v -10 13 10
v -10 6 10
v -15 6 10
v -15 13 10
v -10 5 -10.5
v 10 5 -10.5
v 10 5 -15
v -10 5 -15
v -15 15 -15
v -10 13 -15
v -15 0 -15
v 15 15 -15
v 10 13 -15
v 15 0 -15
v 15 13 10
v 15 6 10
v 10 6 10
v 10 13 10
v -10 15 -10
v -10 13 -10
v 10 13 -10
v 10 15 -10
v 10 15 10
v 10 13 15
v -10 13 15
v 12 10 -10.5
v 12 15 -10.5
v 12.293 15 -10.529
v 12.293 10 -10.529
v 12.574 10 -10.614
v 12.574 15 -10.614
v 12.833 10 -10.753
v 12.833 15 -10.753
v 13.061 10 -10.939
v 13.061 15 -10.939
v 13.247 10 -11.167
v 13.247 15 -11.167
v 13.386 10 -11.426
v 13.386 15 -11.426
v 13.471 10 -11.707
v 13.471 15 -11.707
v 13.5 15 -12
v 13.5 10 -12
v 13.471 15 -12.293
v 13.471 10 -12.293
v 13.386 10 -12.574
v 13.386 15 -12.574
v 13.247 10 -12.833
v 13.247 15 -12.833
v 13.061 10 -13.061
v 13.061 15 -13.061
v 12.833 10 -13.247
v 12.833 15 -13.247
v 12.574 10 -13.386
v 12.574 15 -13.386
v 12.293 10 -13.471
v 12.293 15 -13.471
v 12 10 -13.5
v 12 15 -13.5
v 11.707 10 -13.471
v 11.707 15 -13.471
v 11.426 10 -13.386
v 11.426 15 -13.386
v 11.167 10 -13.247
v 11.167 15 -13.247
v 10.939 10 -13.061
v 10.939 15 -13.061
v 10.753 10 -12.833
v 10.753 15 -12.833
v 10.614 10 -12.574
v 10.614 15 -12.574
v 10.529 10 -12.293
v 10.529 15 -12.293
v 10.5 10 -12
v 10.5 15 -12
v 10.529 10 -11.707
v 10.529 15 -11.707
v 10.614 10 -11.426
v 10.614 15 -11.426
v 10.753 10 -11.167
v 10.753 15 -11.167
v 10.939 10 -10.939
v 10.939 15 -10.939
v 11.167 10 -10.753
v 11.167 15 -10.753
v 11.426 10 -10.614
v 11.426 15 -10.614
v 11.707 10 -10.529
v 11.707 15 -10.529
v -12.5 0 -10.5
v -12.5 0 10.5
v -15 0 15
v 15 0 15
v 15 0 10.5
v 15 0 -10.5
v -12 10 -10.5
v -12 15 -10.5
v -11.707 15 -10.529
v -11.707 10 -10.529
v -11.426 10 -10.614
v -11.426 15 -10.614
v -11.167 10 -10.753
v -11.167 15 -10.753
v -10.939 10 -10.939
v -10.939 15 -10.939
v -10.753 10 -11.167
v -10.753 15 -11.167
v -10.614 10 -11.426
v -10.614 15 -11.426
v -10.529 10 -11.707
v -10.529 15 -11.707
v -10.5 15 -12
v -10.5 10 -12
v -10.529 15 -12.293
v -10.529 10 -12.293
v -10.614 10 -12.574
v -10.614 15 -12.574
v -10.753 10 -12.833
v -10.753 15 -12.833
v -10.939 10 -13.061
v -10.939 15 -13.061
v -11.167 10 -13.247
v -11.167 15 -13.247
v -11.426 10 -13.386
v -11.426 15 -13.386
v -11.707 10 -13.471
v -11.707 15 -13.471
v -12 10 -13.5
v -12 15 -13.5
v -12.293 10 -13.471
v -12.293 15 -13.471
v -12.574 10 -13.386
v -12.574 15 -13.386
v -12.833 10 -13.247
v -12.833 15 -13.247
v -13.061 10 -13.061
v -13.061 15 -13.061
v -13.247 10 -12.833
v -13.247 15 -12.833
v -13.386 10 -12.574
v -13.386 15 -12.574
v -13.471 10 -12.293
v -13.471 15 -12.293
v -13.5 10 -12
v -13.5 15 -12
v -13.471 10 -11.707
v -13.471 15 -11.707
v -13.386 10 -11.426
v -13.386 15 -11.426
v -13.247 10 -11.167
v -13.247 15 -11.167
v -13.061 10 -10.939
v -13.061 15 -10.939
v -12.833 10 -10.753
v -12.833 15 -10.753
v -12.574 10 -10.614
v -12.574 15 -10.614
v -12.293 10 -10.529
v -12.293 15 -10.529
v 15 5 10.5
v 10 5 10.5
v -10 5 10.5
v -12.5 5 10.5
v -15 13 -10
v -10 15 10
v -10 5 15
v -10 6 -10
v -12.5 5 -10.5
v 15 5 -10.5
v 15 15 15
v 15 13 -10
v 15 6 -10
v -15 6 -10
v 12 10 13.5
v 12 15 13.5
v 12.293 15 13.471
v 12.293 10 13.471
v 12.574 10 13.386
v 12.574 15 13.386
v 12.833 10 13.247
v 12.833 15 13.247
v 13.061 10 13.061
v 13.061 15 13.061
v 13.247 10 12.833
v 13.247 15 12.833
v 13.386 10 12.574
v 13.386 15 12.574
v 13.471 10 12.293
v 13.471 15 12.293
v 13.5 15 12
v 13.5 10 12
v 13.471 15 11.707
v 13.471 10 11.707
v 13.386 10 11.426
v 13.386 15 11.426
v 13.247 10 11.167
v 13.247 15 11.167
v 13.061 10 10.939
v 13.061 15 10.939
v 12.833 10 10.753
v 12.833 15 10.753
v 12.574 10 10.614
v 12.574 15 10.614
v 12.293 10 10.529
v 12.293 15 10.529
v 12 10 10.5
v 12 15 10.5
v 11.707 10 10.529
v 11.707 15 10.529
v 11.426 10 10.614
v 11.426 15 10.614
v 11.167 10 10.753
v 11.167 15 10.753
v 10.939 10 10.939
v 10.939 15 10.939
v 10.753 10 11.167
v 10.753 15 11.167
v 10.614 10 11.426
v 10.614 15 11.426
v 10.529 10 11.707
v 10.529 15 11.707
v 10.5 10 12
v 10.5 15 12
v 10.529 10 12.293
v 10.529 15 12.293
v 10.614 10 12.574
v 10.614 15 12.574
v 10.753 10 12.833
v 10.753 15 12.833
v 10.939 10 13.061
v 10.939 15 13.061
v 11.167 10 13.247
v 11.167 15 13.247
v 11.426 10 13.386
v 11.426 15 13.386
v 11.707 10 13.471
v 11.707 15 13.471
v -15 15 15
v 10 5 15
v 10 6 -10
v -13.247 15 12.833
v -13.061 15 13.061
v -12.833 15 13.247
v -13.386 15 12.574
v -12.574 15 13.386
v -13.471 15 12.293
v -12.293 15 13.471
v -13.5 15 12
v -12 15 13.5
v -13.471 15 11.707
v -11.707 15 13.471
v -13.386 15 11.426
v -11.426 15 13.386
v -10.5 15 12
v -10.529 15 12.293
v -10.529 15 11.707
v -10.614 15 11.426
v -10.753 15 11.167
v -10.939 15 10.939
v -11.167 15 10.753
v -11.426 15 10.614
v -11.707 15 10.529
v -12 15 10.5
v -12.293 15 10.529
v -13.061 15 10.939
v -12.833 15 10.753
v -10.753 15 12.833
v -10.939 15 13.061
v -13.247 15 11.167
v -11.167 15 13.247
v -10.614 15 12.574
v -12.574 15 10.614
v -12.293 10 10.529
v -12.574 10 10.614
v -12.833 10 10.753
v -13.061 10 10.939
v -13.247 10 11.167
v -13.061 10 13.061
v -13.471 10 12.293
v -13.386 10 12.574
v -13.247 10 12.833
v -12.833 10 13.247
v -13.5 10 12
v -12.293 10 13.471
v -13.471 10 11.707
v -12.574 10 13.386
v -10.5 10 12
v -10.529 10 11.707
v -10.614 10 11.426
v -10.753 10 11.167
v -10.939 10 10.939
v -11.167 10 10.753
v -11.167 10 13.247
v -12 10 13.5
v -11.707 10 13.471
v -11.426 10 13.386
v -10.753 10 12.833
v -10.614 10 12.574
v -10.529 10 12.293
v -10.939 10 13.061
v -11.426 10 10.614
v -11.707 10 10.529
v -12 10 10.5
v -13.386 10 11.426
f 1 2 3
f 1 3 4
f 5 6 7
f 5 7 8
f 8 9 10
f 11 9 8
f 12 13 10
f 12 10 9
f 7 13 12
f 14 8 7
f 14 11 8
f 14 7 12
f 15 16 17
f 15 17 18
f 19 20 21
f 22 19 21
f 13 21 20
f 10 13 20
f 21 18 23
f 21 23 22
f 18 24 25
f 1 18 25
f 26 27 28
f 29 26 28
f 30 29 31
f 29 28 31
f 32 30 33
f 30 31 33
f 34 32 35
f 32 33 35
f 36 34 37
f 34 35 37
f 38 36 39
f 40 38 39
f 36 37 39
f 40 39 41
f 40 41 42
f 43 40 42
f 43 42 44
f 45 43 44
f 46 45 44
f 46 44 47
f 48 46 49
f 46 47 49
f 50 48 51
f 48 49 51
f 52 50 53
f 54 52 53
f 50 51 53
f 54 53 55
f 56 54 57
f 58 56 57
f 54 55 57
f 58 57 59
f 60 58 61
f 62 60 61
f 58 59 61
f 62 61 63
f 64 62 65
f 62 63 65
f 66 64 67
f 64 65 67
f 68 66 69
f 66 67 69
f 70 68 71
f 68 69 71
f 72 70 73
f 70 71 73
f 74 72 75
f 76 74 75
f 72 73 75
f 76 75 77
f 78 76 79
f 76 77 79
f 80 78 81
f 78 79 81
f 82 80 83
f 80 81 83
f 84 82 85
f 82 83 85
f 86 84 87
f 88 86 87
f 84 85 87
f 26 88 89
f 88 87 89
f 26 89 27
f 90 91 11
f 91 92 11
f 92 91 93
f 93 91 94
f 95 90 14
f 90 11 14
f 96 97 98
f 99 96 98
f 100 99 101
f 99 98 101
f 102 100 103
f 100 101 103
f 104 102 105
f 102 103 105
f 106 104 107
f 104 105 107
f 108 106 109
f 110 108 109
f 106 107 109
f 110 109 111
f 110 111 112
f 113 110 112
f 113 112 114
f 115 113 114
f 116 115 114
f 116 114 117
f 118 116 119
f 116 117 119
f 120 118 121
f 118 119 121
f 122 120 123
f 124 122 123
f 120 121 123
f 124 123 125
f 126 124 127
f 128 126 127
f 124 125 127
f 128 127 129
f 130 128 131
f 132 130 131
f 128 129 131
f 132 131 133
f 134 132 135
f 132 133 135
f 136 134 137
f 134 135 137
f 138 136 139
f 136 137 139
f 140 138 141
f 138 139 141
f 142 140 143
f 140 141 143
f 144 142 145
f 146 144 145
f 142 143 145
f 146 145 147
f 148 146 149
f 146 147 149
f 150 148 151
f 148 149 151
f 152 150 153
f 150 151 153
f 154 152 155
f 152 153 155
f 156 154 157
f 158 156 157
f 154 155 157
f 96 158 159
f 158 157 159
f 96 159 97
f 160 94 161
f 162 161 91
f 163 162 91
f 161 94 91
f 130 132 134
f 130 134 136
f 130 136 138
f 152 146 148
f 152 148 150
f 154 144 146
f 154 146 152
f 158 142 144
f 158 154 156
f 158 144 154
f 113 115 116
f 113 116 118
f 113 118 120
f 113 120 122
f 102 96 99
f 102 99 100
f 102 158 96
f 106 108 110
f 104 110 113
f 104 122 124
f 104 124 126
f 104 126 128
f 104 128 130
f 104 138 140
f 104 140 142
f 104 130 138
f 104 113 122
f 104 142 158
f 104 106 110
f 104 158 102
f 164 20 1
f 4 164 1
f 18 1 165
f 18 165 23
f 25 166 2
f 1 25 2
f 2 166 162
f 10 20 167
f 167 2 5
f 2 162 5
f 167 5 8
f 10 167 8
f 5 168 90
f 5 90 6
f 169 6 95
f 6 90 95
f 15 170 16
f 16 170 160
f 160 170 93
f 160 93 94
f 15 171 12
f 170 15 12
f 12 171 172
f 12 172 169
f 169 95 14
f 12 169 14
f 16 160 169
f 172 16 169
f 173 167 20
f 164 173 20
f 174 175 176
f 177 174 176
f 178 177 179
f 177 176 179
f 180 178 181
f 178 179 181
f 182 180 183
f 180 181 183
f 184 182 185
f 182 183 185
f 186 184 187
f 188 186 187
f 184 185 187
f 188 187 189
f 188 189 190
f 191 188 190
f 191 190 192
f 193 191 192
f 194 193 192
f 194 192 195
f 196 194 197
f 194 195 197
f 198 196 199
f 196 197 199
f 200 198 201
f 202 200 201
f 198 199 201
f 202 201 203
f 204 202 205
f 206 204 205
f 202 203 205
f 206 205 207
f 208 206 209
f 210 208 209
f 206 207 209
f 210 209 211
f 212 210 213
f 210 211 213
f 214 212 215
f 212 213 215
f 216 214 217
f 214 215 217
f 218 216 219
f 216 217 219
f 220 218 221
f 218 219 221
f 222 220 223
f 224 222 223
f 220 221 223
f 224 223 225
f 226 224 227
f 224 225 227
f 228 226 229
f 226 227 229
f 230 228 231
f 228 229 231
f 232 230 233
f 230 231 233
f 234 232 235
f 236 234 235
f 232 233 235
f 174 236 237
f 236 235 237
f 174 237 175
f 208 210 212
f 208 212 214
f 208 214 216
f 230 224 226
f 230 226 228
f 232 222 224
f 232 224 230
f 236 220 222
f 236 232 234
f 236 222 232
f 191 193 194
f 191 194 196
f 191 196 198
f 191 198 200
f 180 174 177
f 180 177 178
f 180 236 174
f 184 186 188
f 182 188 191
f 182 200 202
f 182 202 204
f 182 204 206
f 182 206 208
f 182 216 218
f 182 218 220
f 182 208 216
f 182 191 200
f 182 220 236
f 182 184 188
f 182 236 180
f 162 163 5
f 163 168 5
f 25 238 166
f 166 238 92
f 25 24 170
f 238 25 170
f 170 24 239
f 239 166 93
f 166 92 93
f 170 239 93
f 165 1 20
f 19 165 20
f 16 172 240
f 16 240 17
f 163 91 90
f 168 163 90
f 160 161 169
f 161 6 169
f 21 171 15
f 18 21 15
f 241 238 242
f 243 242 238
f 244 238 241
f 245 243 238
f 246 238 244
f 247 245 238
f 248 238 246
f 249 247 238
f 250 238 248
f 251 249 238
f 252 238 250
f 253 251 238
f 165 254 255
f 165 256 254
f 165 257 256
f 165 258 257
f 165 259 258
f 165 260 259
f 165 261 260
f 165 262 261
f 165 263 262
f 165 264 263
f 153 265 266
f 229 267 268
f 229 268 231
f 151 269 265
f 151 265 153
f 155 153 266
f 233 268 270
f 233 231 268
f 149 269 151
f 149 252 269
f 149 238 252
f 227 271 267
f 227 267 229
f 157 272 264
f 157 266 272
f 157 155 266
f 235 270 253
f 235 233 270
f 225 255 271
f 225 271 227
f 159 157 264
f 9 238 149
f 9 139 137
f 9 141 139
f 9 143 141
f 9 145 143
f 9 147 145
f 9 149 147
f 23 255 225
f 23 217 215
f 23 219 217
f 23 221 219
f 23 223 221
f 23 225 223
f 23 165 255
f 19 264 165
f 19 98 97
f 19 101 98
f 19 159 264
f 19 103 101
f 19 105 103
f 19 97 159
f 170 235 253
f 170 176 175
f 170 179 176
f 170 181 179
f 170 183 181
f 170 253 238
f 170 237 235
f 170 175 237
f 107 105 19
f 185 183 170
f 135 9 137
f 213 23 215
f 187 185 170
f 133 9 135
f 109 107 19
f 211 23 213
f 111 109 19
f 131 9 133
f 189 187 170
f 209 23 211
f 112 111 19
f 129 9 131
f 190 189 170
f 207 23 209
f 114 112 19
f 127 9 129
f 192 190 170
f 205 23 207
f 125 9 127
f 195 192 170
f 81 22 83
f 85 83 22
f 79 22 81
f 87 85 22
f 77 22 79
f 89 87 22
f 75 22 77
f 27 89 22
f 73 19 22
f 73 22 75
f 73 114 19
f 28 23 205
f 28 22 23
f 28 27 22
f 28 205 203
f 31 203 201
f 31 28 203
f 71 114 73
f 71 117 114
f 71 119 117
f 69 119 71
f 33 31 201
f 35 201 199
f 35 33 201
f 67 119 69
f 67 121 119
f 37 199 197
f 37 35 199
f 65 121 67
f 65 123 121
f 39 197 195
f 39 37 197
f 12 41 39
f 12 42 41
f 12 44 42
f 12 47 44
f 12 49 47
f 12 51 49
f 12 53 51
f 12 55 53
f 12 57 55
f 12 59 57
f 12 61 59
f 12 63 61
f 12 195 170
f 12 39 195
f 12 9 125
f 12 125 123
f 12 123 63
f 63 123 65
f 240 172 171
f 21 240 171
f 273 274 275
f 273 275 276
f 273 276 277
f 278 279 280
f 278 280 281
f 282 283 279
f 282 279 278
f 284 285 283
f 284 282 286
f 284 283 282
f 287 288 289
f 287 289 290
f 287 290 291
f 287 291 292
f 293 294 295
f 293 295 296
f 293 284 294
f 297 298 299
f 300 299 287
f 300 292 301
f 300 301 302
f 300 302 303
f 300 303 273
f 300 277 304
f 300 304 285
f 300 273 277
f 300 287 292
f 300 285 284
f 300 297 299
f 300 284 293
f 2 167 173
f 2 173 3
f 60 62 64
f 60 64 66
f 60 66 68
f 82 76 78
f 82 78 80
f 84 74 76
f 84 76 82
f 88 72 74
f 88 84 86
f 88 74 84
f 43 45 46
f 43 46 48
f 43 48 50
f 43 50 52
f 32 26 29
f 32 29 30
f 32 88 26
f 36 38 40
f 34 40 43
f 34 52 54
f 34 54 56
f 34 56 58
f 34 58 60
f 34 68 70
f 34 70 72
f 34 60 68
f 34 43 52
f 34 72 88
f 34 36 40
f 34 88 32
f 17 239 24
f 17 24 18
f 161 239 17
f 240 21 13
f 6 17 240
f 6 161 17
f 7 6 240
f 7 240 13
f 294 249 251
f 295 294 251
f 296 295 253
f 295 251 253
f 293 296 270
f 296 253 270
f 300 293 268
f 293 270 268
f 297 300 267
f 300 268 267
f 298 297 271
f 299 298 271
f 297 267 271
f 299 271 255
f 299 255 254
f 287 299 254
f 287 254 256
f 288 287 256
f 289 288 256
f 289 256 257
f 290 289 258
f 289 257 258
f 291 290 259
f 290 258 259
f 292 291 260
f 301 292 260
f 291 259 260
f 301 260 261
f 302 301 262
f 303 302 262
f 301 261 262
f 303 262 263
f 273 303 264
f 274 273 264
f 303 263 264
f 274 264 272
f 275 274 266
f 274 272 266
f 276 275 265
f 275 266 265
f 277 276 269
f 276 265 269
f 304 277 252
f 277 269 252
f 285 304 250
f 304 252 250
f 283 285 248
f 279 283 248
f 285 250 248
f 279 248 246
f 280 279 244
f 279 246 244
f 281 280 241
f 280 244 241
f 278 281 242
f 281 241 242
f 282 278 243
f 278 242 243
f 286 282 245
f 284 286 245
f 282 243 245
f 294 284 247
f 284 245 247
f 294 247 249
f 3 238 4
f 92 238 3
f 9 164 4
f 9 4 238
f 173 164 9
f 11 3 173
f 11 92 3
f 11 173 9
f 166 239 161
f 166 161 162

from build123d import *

# Parameters (mm, degrees)
BOSS_EXTRUDE3_DEPTH     = 5
SKETCH2_W               = 30
SKETCH2_H               = 30
SKETCH2_W_2             = 20
SKETCH2_H_2             = 20
BOSS_EXTRUDE4_DEPTH     = 10
SKETCH3_R               = 1.5
CUT_EXTRUDE1_DEPTH      = 5
CUT_EXTRUDE2_DEPTH      = 37.742346142
CUT_EXTRUDE2_DEPTH_BACK = 37.742346142
SKETCH4_W               = 20
SKETCH4_H               = 8
CUT_EXTRUDE3_DEPTH      = 37.742346142
CUT_EXTRUDE3_DEPTH_BACK = 37.742346142
SKETCH5_W               = 20
SKETCH5_H               = 7


with BuildPart() as part:
    # Sketch1 → Boss-Extrude3 (new body)
    with BuildSketch(Plane(origin=(0, 0, 0), x_dir=(1, 0, 0), z_dir=(0, 1, 0))):
        Polygon((-15, 15), (-15, -15), (15, -15), (15, -10.5), (12.5, -10.5), (-12.5, -10.5), (-12.5, 10.5), (12.5, 10.5), (15, 10.5), (15, 15), align=None)
    extrude(amount=BOSS_EXTRUDE3_DEPTH)

    # Sketch2 → Boss-Extrude4 (add)
    with BuildSketch(Plane(origin=(0, 5, 0), x_dir=(1, 0, 0), z_dir=(0, 1, 0))):
        Rectangle(SKETCH2_W, SKETCH2_H)
        Rectangle(SKETCH2_W_2, SKETCH2_H_2, mode=Mode.SUBTRACT)
    extrude(amount=BOSS_EXTRUDE4_DEPTH)

    # Sketch3 → Cut-Extrude1 (cut)
    with BuildSketch(Plane(origin=(0, 15, 0), x_dir=(1, 0, 0), z_dir=(0, 1, 0))):
        with Locations((-12, 12)):
            Circle(SKETCH3_R)
        with Locations((12, 12)):
            Circle(SKETCH3_R)
        with Locations((12, -12)):
            Circle(SKETCH3_R)
        with Locations((-12, -12)):
            Circle(SKETCH3_R)
    extrude(amount=-CUT_EXTRUDE1_DEPTH, mode=Mode.SUBTRACT)

    # Sketch4 → Cut-Extrude2 (cut, two sides: drawn at the far end of the back side and taken through both)
    with BuildSketch(Plane(origin=(0, 0, -15), x_dir=(-1, 0, 0), z_dir=(0, 0, -1)).offset(-CUT_EXTRUDE2_DEPTH_BACK)):
        with Locations((0, 9)):
            Rectangle(SKETCH4_W, SKETCH4_H)
    extrude(amount=CUT_EXTRUDE2_DEPTH + CUT_EXTRUDE2_DEPTH_BACK, mode=Mode.SUBTRACT)

    # Sketch5 → Cut-Extrude3 (cut, two sides: drawn at the far end of the back side and taken through both)
    with BuildSketch(Plane.ZY.offset(15).offset(-CUT_EXTRUDE3_DEPTH_BACK)):
        with Locations((0, 9.5)):
            Rectangle(SKETCH5_W, SKETCH5_H)
    extrude(amount=CUT_EXTRUDE3_DEPTH + CUT_EXTRUDE3_DEPTH_BACK, mode=Mode.SUBTRACT)


solid = part.part
